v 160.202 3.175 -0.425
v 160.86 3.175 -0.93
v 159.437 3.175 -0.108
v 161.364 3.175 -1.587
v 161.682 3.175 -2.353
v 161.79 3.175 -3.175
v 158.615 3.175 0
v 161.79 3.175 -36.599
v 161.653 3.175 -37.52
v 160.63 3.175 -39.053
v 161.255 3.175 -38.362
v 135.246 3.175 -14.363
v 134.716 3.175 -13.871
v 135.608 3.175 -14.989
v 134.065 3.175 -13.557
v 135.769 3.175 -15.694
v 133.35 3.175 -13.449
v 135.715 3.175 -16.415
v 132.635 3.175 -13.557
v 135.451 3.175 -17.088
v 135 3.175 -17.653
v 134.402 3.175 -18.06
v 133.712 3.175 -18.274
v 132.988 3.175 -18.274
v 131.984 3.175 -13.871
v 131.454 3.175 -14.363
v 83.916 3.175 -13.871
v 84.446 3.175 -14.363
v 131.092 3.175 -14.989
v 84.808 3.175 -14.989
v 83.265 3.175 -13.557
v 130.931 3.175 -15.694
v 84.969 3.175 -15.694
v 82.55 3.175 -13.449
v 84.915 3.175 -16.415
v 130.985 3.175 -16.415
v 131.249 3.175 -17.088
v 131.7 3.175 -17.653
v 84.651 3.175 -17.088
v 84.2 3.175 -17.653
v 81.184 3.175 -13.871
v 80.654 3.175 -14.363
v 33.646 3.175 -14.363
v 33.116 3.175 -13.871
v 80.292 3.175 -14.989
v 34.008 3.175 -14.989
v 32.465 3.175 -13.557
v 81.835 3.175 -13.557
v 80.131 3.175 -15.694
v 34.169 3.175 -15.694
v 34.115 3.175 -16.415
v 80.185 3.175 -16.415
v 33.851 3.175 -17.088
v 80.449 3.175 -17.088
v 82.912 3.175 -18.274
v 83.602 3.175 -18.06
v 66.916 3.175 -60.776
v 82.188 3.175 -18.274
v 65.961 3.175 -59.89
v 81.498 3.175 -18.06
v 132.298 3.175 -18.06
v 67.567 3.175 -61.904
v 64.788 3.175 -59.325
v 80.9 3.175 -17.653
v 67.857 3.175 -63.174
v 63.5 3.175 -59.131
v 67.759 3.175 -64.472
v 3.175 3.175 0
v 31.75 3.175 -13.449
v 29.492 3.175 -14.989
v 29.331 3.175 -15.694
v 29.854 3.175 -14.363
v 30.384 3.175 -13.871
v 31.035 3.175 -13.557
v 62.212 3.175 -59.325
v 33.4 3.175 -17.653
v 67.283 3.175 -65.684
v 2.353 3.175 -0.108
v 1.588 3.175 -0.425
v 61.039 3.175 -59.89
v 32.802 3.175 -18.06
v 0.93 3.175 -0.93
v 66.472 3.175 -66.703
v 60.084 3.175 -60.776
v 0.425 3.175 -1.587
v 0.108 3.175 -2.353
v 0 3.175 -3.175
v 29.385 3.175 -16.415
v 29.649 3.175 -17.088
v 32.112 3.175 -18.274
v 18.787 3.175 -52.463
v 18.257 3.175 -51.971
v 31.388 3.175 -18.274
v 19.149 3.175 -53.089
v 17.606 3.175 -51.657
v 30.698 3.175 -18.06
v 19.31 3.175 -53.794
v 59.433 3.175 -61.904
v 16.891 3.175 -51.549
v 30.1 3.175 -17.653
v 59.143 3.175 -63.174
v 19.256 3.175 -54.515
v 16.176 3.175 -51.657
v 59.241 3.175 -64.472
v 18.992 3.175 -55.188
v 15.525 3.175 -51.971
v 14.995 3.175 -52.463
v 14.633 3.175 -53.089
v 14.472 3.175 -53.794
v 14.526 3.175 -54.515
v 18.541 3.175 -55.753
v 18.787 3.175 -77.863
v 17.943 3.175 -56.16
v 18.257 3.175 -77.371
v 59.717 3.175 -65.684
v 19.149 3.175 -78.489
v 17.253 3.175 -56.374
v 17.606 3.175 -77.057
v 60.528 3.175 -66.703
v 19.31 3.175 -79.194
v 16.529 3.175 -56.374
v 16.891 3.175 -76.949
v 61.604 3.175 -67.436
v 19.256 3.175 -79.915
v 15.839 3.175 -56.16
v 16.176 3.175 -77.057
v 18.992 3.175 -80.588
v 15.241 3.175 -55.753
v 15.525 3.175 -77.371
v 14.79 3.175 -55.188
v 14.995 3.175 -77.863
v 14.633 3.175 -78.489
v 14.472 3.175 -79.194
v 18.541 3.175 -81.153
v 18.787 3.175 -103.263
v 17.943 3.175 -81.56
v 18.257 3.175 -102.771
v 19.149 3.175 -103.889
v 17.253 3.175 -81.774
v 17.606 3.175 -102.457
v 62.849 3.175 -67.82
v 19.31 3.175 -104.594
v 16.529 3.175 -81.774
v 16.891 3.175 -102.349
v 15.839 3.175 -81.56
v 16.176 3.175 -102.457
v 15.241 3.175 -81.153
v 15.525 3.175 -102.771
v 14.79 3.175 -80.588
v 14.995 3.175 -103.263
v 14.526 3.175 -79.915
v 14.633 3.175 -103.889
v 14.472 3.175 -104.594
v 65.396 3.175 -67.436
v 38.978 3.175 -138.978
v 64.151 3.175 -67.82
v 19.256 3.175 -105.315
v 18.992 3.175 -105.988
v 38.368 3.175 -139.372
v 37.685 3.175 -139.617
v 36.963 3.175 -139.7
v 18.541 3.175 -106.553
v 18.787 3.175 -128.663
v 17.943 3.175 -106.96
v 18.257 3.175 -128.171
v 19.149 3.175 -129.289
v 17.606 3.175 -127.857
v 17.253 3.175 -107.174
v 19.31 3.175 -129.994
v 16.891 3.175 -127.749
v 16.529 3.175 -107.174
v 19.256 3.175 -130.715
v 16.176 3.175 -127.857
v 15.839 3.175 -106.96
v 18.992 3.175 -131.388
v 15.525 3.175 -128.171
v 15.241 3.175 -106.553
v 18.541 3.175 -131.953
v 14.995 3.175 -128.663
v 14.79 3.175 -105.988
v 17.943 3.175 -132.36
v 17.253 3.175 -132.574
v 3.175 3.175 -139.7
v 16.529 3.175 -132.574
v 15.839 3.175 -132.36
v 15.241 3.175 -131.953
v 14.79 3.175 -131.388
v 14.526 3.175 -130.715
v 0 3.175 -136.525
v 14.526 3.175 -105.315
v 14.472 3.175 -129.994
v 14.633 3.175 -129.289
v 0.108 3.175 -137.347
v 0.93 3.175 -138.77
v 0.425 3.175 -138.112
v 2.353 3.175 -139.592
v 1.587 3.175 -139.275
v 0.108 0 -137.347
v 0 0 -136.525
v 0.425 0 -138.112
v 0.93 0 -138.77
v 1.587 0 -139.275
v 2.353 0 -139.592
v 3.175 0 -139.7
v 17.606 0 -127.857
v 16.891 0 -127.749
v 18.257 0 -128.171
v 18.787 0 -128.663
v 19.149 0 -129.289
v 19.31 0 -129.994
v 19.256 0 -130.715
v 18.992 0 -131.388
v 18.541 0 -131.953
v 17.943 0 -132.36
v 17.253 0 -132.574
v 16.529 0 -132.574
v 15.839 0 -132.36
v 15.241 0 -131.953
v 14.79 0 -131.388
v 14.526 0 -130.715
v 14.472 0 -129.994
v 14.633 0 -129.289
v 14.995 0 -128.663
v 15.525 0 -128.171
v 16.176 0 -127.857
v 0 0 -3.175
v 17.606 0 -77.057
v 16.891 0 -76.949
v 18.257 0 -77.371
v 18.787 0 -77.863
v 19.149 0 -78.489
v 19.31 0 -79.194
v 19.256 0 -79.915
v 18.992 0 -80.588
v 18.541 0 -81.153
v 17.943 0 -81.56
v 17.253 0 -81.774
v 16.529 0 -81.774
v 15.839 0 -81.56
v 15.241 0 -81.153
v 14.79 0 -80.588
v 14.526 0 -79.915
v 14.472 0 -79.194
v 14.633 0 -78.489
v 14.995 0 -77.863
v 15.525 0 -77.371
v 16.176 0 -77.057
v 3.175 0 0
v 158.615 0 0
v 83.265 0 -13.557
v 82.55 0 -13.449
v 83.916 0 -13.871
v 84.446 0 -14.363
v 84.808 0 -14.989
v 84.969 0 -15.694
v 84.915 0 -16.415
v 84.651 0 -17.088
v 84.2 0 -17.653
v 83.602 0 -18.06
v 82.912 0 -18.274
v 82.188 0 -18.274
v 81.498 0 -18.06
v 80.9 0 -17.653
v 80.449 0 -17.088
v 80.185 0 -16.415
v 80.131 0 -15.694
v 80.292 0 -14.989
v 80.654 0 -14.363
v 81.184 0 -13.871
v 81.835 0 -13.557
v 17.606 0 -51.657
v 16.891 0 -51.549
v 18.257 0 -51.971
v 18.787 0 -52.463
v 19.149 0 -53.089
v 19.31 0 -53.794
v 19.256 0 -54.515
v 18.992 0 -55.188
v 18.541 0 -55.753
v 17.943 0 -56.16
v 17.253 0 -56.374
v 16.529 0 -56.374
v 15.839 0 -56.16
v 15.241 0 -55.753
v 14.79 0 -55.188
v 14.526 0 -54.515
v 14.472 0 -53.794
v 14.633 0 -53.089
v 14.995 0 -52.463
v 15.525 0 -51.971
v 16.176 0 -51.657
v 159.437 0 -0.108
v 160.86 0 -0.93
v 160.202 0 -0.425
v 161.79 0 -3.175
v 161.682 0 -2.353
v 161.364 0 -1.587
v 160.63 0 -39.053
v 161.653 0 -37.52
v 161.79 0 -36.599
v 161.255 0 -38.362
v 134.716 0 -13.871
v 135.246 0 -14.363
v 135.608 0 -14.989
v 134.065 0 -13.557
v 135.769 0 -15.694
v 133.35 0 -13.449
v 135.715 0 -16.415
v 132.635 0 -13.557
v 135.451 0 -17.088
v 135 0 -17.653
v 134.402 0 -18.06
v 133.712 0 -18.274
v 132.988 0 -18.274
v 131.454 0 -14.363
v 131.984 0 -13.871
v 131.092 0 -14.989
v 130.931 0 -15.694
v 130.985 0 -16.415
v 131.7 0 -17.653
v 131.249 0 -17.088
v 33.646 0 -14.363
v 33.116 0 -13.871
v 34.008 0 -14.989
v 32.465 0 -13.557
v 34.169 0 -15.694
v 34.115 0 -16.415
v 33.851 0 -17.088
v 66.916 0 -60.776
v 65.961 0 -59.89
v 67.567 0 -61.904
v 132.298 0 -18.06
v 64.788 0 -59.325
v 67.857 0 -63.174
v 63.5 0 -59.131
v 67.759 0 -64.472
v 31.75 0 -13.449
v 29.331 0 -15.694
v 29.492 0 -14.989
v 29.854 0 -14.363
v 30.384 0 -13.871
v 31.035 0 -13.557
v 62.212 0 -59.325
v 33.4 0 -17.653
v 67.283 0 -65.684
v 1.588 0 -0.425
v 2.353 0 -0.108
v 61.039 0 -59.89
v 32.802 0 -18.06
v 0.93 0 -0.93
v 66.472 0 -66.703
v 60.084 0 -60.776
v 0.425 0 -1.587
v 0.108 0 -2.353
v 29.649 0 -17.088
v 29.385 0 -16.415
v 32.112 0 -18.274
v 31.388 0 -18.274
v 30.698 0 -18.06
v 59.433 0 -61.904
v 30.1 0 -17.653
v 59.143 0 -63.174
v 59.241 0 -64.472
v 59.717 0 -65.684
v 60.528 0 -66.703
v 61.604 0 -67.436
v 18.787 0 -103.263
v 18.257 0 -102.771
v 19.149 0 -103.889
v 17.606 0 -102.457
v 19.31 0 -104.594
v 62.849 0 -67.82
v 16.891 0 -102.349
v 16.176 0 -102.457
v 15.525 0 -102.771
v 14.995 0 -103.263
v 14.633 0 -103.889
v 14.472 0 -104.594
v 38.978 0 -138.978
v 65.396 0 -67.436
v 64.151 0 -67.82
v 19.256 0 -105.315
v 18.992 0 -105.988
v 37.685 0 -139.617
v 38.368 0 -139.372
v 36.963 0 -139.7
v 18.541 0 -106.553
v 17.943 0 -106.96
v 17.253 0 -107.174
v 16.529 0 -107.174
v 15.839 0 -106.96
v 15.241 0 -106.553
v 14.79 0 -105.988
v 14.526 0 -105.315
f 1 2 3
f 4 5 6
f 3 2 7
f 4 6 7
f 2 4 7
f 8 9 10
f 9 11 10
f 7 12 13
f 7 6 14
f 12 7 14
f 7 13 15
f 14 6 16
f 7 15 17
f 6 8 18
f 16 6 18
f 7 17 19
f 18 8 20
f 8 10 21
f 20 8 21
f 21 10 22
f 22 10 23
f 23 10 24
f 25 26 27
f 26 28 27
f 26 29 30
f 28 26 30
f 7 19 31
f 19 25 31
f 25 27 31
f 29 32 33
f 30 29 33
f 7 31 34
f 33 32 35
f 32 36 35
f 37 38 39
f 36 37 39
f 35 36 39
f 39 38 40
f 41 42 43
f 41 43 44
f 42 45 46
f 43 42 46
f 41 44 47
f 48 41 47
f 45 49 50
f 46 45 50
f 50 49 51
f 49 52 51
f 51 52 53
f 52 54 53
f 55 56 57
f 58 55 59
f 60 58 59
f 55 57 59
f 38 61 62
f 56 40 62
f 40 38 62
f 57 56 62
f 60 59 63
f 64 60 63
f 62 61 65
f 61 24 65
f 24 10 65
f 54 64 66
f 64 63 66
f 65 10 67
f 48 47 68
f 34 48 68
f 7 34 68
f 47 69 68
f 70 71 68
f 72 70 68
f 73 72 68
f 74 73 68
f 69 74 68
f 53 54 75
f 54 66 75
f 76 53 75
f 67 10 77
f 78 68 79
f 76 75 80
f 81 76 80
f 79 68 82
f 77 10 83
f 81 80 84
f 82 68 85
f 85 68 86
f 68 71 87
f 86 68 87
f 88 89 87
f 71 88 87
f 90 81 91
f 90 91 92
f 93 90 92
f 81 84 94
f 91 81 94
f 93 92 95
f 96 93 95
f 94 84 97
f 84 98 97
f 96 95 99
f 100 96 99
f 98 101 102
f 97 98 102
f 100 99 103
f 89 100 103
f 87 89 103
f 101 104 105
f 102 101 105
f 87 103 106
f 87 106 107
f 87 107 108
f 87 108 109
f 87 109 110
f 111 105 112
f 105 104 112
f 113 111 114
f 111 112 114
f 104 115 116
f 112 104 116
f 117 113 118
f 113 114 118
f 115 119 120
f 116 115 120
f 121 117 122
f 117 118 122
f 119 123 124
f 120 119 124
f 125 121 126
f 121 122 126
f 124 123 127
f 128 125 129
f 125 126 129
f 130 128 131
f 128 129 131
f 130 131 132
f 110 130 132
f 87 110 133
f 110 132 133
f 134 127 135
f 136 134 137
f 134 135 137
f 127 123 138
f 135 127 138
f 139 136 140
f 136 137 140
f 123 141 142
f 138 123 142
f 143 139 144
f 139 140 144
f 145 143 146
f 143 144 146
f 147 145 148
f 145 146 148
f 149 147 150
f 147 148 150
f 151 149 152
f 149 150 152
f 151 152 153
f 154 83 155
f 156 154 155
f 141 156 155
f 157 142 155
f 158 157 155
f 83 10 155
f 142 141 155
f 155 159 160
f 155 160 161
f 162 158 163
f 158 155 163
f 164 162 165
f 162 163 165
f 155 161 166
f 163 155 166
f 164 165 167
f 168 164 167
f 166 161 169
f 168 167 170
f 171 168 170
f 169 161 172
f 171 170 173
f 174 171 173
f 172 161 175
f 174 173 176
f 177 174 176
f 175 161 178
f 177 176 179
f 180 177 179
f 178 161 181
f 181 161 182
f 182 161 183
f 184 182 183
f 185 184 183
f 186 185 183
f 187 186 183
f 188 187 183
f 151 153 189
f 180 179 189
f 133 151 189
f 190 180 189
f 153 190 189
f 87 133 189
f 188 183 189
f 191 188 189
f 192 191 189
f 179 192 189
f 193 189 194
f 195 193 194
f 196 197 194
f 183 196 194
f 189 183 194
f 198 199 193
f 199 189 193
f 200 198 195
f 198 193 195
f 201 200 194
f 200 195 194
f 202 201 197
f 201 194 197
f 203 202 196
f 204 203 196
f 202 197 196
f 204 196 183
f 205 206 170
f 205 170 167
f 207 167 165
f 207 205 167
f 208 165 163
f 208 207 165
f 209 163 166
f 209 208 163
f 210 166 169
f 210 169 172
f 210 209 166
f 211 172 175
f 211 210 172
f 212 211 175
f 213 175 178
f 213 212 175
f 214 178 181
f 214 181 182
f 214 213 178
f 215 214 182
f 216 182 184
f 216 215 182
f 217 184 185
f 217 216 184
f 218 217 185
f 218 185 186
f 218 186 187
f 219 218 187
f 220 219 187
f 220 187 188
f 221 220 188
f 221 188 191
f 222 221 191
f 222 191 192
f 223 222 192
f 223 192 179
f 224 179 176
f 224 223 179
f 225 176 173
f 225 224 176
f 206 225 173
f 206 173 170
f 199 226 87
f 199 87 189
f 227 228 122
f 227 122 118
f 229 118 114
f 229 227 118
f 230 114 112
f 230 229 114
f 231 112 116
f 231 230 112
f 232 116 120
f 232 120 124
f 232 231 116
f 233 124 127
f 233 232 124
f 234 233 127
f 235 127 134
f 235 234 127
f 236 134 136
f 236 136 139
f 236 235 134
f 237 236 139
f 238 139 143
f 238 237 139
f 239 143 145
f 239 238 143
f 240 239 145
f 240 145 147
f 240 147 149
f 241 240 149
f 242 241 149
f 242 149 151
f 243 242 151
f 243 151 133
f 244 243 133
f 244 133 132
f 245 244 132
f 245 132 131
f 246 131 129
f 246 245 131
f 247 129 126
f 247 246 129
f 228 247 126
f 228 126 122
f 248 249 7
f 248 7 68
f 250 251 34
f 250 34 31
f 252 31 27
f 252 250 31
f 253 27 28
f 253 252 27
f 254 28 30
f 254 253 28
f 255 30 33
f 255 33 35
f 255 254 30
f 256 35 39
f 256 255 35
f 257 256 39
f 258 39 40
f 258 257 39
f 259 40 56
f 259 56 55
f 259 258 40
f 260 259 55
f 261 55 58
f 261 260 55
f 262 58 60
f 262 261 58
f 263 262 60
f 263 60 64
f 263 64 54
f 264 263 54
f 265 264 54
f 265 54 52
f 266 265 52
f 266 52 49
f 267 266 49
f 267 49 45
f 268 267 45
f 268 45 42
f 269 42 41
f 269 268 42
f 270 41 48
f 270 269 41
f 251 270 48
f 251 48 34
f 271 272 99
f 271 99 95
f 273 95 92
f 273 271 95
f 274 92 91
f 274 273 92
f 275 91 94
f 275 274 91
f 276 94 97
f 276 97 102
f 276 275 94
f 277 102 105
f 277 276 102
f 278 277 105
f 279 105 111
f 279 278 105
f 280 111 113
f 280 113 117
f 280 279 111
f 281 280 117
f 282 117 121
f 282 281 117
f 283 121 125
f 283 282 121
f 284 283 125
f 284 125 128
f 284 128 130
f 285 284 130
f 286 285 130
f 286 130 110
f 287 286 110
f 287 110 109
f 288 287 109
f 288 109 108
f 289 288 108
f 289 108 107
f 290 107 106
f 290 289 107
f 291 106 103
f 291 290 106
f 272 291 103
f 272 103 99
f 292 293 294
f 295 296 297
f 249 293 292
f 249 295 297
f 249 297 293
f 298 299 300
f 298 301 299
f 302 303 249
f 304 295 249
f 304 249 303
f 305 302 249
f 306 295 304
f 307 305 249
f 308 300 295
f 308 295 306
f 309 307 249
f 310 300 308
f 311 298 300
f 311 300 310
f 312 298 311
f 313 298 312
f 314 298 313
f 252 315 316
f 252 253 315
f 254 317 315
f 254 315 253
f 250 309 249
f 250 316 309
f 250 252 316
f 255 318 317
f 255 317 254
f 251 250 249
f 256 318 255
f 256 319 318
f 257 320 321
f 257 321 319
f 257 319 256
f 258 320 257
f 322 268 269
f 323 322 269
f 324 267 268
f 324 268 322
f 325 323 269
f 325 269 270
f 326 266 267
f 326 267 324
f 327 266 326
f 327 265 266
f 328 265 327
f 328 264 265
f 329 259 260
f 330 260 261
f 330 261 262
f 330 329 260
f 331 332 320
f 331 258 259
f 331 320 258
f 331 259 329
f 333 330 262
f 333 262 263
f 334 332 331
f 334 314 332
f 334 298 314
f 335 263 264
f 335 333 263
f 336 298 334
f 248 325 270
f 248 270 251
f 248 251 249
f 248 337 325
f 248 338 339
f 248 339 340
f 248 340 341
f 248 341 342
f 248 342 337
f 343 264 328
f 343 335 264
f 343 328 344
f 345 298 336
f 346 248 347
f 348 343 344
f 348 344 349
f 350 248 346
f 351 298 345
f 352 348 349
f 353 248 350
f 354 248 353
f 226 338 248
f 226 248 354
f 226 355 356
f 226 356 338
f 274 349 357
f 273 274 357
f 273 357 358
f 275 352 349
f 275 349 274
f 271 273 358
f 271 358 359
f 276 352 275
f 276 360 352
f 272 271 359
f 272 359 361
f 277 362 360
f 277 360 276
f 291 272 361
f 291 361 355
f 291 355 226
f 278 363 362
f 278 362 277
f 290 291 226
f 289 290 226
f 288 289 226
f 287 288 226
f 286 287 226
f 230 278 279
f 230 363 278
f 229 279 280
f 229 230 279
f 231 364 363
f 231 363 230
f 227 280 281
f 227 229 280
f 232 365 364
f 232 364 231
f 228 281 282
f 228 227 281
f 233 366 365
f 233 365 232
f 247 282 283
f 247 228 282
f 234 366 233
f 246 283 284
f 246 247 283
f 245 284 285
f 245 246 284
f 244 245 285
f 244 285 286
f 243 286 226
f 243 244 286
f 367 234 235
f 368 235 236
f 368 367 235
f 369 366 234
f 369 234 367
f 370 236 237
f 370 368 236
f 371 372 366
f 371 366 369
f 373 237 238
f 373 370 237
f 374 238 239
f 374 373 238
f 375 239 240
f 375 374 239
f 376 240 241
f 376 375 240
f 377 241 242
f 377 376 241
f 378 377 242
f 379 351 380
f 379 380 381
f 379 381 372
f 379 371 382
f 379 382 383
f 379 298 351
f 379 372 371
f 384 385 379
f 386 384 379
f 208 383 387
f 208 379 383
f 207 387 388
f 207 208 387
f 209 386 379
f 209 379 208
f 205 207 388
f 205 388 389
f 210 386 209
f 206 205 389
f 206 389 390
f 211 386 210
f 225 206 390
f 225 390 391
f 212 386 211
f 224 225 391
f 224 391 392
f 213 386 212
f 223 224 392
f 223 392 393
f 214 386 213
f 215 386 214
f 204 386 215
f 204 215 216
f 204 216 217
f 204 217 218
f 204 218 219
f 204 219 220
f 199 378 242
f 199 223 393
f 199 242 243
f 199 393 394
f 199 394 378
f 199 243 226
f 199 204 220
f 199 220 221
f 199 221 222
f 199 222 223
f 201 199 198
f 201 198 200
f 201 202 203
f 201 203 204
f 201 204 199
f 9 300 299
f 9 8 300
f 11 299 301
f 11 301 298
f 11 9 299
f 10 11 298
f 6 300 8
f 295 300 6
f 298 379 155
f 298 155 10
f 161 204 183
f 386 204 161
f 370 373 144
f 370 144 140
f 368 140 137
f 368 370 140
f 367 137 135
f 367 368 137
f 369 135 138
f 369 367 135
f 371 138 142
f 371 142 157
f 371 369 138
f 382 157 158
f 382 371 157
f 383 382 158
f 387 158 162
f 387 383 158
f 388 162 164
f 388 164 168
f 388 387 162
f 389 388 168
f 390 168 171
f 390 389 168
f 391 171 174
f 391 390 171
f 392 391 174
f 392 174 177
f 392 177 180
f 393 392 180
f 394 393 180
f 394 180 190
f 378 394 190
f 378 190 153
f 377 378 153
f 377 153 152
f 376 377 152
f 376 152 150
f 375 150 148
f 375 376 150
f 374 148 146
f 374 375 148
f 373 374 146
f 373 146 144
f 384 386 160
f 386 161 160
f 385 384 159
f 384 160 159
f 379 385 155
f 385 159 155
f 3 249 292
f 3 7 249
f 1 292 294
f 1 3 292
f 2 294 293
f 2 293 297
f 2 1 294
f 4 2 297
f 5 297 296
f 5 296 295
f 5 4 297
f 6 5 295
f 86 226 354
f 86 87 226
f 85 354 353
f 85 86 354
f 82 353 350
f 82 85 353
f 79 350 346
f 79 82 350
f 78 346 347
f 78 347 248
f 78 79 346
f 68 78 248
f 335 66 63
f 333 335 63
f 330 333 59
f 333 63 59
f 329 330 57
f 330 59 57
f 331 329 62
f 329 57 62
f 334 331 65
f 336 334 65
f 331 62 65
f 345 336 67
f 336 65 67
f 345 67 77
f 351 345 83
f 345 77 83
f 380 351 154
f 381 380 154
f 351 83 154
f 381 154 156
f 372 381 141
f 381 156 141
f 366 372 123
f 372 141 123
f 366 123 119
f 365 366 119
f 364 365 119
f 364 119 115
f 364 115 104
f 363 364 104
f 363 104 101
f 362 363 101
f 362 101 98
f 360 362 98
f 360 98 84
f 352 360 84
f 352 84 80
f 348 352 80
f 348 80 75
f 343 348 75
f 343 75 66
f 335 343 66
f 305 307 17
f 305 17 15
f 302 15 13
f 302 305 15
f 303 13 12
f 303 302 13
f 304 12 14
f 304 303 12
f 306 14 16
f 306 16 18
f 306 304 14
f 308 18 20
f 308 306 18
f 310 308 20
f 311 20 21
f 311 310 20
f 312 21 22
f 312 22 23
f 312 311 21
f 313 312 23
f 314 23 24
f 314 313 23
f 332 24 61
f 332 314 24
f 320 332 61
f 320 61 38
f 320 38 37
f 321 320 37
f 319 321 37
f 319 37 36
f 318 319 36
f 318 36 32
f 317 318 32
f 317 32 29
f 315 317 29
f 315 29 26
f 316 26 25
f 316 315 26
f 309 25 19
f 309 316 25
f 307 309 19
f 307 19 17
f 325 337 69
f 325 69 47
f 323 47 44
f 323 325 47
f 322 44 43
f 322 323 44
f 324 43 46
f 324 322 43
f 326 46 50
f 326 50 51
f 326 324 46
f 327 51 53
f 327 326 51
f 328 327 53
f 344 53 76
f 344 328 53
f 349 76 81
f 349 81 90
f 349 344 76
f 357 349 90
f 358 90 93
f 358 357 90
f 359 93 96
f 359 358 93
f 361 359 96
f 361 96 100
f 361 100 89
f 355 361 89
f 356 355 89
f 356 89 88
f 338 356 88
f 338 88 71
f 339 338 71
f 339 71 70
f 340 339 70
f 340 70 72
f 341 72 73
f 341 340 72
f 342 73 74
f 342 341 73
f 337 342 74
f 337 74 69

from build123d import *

# Parameters (mm, degrees)
SKETCH1_R           = 2.4257
BOSS_EXTRUDE1_DEPTH = 3.175
FILLET1_R           = 3.175
SKETCH2_R           = 4.3688
CUT_EXTRUDE1_DEPTH  = 214.780566999


with BuildPart() as part:
    # Sketch1 → Boss-Extrude1 (new body)
    with BuildSketch(Plane(origin=(0, 0, 0), x_dir=(1, 0, 0), z_dir=(0, 1, 0))):
        Polygon((0, 0), (0, 139.7), (38.1, 139.7), (161.789864335, 38.1), (161.789864335, 0), align=None)
        with Locations(Location((31.75, 15.875, 0), (0, 0, 270))):
            Circle(SKETCH1_R, mode=Mode.SUBTRACT)
        with Locations(Location((82.55, 15.875, 0), (0, 0, 270))):
            Circle(SKETCH1_R, mode=Mode.SUBTRACT)
        with Locations(Location((133.35, 15.875, 0), (0, 0, 270))):
            Circle(SKETCH1_R, mode=Mode.SUBTRACT)
        with Locations(Location((16.891, 53.975, 0), (0, 0, 270))):
            Circle(SKETCH1_R, mode=Mode.SUBTRACT)
        with Locations(Location((16.891, 79.375, 0), (0, 0, 270))):
            Circle(SKETCH1_R, mode=Mode.SUBTRACT)
        with Locations(Location((16.891, 104.775, 0), (0, 0, 270))):
            Circle(SKETCH1_R, mode=Mode.SUBTRACT)
        with Locations(Location((16.891, 130.175, 0), (0, 0, 270))):
            Circle(SKETCH1_R, mode=Mode.SUBTRACT)
    extrude(amount=BOSS_EXTRUDE1_DEPTH)

    # Fillet1
    fillet1_edges = [part.edges().sort_by_distance(p)[0] for p in [
        (0, 1.5875, 0),
        (0, 1.5875, -139.7),
        (38.1, 1.5875, -139.7),
        (161.789864335, 1.5875, -38.1),
        (161.789864335, 1.5875, 0),
    ]]
    fillet(fillet1_edges, radius=FILLET1_R)

    # Sketch2 → Cut-Extrude1 (cut, through all)
    with BuildSketch(Plane(origin=(0, 3.175, 0), x_dir=(1, 0, 0), z_dir=(0, 1, 0))):
        with Locations(Location((63.5, 63.5, 0), (0, 0, 270))):
            Circle(SKETCH2_R)
    extrude(amount=-CUT_EXTRUDE1_DEPTH, mode=Mode.SUBTRACT)


solid = part.part
